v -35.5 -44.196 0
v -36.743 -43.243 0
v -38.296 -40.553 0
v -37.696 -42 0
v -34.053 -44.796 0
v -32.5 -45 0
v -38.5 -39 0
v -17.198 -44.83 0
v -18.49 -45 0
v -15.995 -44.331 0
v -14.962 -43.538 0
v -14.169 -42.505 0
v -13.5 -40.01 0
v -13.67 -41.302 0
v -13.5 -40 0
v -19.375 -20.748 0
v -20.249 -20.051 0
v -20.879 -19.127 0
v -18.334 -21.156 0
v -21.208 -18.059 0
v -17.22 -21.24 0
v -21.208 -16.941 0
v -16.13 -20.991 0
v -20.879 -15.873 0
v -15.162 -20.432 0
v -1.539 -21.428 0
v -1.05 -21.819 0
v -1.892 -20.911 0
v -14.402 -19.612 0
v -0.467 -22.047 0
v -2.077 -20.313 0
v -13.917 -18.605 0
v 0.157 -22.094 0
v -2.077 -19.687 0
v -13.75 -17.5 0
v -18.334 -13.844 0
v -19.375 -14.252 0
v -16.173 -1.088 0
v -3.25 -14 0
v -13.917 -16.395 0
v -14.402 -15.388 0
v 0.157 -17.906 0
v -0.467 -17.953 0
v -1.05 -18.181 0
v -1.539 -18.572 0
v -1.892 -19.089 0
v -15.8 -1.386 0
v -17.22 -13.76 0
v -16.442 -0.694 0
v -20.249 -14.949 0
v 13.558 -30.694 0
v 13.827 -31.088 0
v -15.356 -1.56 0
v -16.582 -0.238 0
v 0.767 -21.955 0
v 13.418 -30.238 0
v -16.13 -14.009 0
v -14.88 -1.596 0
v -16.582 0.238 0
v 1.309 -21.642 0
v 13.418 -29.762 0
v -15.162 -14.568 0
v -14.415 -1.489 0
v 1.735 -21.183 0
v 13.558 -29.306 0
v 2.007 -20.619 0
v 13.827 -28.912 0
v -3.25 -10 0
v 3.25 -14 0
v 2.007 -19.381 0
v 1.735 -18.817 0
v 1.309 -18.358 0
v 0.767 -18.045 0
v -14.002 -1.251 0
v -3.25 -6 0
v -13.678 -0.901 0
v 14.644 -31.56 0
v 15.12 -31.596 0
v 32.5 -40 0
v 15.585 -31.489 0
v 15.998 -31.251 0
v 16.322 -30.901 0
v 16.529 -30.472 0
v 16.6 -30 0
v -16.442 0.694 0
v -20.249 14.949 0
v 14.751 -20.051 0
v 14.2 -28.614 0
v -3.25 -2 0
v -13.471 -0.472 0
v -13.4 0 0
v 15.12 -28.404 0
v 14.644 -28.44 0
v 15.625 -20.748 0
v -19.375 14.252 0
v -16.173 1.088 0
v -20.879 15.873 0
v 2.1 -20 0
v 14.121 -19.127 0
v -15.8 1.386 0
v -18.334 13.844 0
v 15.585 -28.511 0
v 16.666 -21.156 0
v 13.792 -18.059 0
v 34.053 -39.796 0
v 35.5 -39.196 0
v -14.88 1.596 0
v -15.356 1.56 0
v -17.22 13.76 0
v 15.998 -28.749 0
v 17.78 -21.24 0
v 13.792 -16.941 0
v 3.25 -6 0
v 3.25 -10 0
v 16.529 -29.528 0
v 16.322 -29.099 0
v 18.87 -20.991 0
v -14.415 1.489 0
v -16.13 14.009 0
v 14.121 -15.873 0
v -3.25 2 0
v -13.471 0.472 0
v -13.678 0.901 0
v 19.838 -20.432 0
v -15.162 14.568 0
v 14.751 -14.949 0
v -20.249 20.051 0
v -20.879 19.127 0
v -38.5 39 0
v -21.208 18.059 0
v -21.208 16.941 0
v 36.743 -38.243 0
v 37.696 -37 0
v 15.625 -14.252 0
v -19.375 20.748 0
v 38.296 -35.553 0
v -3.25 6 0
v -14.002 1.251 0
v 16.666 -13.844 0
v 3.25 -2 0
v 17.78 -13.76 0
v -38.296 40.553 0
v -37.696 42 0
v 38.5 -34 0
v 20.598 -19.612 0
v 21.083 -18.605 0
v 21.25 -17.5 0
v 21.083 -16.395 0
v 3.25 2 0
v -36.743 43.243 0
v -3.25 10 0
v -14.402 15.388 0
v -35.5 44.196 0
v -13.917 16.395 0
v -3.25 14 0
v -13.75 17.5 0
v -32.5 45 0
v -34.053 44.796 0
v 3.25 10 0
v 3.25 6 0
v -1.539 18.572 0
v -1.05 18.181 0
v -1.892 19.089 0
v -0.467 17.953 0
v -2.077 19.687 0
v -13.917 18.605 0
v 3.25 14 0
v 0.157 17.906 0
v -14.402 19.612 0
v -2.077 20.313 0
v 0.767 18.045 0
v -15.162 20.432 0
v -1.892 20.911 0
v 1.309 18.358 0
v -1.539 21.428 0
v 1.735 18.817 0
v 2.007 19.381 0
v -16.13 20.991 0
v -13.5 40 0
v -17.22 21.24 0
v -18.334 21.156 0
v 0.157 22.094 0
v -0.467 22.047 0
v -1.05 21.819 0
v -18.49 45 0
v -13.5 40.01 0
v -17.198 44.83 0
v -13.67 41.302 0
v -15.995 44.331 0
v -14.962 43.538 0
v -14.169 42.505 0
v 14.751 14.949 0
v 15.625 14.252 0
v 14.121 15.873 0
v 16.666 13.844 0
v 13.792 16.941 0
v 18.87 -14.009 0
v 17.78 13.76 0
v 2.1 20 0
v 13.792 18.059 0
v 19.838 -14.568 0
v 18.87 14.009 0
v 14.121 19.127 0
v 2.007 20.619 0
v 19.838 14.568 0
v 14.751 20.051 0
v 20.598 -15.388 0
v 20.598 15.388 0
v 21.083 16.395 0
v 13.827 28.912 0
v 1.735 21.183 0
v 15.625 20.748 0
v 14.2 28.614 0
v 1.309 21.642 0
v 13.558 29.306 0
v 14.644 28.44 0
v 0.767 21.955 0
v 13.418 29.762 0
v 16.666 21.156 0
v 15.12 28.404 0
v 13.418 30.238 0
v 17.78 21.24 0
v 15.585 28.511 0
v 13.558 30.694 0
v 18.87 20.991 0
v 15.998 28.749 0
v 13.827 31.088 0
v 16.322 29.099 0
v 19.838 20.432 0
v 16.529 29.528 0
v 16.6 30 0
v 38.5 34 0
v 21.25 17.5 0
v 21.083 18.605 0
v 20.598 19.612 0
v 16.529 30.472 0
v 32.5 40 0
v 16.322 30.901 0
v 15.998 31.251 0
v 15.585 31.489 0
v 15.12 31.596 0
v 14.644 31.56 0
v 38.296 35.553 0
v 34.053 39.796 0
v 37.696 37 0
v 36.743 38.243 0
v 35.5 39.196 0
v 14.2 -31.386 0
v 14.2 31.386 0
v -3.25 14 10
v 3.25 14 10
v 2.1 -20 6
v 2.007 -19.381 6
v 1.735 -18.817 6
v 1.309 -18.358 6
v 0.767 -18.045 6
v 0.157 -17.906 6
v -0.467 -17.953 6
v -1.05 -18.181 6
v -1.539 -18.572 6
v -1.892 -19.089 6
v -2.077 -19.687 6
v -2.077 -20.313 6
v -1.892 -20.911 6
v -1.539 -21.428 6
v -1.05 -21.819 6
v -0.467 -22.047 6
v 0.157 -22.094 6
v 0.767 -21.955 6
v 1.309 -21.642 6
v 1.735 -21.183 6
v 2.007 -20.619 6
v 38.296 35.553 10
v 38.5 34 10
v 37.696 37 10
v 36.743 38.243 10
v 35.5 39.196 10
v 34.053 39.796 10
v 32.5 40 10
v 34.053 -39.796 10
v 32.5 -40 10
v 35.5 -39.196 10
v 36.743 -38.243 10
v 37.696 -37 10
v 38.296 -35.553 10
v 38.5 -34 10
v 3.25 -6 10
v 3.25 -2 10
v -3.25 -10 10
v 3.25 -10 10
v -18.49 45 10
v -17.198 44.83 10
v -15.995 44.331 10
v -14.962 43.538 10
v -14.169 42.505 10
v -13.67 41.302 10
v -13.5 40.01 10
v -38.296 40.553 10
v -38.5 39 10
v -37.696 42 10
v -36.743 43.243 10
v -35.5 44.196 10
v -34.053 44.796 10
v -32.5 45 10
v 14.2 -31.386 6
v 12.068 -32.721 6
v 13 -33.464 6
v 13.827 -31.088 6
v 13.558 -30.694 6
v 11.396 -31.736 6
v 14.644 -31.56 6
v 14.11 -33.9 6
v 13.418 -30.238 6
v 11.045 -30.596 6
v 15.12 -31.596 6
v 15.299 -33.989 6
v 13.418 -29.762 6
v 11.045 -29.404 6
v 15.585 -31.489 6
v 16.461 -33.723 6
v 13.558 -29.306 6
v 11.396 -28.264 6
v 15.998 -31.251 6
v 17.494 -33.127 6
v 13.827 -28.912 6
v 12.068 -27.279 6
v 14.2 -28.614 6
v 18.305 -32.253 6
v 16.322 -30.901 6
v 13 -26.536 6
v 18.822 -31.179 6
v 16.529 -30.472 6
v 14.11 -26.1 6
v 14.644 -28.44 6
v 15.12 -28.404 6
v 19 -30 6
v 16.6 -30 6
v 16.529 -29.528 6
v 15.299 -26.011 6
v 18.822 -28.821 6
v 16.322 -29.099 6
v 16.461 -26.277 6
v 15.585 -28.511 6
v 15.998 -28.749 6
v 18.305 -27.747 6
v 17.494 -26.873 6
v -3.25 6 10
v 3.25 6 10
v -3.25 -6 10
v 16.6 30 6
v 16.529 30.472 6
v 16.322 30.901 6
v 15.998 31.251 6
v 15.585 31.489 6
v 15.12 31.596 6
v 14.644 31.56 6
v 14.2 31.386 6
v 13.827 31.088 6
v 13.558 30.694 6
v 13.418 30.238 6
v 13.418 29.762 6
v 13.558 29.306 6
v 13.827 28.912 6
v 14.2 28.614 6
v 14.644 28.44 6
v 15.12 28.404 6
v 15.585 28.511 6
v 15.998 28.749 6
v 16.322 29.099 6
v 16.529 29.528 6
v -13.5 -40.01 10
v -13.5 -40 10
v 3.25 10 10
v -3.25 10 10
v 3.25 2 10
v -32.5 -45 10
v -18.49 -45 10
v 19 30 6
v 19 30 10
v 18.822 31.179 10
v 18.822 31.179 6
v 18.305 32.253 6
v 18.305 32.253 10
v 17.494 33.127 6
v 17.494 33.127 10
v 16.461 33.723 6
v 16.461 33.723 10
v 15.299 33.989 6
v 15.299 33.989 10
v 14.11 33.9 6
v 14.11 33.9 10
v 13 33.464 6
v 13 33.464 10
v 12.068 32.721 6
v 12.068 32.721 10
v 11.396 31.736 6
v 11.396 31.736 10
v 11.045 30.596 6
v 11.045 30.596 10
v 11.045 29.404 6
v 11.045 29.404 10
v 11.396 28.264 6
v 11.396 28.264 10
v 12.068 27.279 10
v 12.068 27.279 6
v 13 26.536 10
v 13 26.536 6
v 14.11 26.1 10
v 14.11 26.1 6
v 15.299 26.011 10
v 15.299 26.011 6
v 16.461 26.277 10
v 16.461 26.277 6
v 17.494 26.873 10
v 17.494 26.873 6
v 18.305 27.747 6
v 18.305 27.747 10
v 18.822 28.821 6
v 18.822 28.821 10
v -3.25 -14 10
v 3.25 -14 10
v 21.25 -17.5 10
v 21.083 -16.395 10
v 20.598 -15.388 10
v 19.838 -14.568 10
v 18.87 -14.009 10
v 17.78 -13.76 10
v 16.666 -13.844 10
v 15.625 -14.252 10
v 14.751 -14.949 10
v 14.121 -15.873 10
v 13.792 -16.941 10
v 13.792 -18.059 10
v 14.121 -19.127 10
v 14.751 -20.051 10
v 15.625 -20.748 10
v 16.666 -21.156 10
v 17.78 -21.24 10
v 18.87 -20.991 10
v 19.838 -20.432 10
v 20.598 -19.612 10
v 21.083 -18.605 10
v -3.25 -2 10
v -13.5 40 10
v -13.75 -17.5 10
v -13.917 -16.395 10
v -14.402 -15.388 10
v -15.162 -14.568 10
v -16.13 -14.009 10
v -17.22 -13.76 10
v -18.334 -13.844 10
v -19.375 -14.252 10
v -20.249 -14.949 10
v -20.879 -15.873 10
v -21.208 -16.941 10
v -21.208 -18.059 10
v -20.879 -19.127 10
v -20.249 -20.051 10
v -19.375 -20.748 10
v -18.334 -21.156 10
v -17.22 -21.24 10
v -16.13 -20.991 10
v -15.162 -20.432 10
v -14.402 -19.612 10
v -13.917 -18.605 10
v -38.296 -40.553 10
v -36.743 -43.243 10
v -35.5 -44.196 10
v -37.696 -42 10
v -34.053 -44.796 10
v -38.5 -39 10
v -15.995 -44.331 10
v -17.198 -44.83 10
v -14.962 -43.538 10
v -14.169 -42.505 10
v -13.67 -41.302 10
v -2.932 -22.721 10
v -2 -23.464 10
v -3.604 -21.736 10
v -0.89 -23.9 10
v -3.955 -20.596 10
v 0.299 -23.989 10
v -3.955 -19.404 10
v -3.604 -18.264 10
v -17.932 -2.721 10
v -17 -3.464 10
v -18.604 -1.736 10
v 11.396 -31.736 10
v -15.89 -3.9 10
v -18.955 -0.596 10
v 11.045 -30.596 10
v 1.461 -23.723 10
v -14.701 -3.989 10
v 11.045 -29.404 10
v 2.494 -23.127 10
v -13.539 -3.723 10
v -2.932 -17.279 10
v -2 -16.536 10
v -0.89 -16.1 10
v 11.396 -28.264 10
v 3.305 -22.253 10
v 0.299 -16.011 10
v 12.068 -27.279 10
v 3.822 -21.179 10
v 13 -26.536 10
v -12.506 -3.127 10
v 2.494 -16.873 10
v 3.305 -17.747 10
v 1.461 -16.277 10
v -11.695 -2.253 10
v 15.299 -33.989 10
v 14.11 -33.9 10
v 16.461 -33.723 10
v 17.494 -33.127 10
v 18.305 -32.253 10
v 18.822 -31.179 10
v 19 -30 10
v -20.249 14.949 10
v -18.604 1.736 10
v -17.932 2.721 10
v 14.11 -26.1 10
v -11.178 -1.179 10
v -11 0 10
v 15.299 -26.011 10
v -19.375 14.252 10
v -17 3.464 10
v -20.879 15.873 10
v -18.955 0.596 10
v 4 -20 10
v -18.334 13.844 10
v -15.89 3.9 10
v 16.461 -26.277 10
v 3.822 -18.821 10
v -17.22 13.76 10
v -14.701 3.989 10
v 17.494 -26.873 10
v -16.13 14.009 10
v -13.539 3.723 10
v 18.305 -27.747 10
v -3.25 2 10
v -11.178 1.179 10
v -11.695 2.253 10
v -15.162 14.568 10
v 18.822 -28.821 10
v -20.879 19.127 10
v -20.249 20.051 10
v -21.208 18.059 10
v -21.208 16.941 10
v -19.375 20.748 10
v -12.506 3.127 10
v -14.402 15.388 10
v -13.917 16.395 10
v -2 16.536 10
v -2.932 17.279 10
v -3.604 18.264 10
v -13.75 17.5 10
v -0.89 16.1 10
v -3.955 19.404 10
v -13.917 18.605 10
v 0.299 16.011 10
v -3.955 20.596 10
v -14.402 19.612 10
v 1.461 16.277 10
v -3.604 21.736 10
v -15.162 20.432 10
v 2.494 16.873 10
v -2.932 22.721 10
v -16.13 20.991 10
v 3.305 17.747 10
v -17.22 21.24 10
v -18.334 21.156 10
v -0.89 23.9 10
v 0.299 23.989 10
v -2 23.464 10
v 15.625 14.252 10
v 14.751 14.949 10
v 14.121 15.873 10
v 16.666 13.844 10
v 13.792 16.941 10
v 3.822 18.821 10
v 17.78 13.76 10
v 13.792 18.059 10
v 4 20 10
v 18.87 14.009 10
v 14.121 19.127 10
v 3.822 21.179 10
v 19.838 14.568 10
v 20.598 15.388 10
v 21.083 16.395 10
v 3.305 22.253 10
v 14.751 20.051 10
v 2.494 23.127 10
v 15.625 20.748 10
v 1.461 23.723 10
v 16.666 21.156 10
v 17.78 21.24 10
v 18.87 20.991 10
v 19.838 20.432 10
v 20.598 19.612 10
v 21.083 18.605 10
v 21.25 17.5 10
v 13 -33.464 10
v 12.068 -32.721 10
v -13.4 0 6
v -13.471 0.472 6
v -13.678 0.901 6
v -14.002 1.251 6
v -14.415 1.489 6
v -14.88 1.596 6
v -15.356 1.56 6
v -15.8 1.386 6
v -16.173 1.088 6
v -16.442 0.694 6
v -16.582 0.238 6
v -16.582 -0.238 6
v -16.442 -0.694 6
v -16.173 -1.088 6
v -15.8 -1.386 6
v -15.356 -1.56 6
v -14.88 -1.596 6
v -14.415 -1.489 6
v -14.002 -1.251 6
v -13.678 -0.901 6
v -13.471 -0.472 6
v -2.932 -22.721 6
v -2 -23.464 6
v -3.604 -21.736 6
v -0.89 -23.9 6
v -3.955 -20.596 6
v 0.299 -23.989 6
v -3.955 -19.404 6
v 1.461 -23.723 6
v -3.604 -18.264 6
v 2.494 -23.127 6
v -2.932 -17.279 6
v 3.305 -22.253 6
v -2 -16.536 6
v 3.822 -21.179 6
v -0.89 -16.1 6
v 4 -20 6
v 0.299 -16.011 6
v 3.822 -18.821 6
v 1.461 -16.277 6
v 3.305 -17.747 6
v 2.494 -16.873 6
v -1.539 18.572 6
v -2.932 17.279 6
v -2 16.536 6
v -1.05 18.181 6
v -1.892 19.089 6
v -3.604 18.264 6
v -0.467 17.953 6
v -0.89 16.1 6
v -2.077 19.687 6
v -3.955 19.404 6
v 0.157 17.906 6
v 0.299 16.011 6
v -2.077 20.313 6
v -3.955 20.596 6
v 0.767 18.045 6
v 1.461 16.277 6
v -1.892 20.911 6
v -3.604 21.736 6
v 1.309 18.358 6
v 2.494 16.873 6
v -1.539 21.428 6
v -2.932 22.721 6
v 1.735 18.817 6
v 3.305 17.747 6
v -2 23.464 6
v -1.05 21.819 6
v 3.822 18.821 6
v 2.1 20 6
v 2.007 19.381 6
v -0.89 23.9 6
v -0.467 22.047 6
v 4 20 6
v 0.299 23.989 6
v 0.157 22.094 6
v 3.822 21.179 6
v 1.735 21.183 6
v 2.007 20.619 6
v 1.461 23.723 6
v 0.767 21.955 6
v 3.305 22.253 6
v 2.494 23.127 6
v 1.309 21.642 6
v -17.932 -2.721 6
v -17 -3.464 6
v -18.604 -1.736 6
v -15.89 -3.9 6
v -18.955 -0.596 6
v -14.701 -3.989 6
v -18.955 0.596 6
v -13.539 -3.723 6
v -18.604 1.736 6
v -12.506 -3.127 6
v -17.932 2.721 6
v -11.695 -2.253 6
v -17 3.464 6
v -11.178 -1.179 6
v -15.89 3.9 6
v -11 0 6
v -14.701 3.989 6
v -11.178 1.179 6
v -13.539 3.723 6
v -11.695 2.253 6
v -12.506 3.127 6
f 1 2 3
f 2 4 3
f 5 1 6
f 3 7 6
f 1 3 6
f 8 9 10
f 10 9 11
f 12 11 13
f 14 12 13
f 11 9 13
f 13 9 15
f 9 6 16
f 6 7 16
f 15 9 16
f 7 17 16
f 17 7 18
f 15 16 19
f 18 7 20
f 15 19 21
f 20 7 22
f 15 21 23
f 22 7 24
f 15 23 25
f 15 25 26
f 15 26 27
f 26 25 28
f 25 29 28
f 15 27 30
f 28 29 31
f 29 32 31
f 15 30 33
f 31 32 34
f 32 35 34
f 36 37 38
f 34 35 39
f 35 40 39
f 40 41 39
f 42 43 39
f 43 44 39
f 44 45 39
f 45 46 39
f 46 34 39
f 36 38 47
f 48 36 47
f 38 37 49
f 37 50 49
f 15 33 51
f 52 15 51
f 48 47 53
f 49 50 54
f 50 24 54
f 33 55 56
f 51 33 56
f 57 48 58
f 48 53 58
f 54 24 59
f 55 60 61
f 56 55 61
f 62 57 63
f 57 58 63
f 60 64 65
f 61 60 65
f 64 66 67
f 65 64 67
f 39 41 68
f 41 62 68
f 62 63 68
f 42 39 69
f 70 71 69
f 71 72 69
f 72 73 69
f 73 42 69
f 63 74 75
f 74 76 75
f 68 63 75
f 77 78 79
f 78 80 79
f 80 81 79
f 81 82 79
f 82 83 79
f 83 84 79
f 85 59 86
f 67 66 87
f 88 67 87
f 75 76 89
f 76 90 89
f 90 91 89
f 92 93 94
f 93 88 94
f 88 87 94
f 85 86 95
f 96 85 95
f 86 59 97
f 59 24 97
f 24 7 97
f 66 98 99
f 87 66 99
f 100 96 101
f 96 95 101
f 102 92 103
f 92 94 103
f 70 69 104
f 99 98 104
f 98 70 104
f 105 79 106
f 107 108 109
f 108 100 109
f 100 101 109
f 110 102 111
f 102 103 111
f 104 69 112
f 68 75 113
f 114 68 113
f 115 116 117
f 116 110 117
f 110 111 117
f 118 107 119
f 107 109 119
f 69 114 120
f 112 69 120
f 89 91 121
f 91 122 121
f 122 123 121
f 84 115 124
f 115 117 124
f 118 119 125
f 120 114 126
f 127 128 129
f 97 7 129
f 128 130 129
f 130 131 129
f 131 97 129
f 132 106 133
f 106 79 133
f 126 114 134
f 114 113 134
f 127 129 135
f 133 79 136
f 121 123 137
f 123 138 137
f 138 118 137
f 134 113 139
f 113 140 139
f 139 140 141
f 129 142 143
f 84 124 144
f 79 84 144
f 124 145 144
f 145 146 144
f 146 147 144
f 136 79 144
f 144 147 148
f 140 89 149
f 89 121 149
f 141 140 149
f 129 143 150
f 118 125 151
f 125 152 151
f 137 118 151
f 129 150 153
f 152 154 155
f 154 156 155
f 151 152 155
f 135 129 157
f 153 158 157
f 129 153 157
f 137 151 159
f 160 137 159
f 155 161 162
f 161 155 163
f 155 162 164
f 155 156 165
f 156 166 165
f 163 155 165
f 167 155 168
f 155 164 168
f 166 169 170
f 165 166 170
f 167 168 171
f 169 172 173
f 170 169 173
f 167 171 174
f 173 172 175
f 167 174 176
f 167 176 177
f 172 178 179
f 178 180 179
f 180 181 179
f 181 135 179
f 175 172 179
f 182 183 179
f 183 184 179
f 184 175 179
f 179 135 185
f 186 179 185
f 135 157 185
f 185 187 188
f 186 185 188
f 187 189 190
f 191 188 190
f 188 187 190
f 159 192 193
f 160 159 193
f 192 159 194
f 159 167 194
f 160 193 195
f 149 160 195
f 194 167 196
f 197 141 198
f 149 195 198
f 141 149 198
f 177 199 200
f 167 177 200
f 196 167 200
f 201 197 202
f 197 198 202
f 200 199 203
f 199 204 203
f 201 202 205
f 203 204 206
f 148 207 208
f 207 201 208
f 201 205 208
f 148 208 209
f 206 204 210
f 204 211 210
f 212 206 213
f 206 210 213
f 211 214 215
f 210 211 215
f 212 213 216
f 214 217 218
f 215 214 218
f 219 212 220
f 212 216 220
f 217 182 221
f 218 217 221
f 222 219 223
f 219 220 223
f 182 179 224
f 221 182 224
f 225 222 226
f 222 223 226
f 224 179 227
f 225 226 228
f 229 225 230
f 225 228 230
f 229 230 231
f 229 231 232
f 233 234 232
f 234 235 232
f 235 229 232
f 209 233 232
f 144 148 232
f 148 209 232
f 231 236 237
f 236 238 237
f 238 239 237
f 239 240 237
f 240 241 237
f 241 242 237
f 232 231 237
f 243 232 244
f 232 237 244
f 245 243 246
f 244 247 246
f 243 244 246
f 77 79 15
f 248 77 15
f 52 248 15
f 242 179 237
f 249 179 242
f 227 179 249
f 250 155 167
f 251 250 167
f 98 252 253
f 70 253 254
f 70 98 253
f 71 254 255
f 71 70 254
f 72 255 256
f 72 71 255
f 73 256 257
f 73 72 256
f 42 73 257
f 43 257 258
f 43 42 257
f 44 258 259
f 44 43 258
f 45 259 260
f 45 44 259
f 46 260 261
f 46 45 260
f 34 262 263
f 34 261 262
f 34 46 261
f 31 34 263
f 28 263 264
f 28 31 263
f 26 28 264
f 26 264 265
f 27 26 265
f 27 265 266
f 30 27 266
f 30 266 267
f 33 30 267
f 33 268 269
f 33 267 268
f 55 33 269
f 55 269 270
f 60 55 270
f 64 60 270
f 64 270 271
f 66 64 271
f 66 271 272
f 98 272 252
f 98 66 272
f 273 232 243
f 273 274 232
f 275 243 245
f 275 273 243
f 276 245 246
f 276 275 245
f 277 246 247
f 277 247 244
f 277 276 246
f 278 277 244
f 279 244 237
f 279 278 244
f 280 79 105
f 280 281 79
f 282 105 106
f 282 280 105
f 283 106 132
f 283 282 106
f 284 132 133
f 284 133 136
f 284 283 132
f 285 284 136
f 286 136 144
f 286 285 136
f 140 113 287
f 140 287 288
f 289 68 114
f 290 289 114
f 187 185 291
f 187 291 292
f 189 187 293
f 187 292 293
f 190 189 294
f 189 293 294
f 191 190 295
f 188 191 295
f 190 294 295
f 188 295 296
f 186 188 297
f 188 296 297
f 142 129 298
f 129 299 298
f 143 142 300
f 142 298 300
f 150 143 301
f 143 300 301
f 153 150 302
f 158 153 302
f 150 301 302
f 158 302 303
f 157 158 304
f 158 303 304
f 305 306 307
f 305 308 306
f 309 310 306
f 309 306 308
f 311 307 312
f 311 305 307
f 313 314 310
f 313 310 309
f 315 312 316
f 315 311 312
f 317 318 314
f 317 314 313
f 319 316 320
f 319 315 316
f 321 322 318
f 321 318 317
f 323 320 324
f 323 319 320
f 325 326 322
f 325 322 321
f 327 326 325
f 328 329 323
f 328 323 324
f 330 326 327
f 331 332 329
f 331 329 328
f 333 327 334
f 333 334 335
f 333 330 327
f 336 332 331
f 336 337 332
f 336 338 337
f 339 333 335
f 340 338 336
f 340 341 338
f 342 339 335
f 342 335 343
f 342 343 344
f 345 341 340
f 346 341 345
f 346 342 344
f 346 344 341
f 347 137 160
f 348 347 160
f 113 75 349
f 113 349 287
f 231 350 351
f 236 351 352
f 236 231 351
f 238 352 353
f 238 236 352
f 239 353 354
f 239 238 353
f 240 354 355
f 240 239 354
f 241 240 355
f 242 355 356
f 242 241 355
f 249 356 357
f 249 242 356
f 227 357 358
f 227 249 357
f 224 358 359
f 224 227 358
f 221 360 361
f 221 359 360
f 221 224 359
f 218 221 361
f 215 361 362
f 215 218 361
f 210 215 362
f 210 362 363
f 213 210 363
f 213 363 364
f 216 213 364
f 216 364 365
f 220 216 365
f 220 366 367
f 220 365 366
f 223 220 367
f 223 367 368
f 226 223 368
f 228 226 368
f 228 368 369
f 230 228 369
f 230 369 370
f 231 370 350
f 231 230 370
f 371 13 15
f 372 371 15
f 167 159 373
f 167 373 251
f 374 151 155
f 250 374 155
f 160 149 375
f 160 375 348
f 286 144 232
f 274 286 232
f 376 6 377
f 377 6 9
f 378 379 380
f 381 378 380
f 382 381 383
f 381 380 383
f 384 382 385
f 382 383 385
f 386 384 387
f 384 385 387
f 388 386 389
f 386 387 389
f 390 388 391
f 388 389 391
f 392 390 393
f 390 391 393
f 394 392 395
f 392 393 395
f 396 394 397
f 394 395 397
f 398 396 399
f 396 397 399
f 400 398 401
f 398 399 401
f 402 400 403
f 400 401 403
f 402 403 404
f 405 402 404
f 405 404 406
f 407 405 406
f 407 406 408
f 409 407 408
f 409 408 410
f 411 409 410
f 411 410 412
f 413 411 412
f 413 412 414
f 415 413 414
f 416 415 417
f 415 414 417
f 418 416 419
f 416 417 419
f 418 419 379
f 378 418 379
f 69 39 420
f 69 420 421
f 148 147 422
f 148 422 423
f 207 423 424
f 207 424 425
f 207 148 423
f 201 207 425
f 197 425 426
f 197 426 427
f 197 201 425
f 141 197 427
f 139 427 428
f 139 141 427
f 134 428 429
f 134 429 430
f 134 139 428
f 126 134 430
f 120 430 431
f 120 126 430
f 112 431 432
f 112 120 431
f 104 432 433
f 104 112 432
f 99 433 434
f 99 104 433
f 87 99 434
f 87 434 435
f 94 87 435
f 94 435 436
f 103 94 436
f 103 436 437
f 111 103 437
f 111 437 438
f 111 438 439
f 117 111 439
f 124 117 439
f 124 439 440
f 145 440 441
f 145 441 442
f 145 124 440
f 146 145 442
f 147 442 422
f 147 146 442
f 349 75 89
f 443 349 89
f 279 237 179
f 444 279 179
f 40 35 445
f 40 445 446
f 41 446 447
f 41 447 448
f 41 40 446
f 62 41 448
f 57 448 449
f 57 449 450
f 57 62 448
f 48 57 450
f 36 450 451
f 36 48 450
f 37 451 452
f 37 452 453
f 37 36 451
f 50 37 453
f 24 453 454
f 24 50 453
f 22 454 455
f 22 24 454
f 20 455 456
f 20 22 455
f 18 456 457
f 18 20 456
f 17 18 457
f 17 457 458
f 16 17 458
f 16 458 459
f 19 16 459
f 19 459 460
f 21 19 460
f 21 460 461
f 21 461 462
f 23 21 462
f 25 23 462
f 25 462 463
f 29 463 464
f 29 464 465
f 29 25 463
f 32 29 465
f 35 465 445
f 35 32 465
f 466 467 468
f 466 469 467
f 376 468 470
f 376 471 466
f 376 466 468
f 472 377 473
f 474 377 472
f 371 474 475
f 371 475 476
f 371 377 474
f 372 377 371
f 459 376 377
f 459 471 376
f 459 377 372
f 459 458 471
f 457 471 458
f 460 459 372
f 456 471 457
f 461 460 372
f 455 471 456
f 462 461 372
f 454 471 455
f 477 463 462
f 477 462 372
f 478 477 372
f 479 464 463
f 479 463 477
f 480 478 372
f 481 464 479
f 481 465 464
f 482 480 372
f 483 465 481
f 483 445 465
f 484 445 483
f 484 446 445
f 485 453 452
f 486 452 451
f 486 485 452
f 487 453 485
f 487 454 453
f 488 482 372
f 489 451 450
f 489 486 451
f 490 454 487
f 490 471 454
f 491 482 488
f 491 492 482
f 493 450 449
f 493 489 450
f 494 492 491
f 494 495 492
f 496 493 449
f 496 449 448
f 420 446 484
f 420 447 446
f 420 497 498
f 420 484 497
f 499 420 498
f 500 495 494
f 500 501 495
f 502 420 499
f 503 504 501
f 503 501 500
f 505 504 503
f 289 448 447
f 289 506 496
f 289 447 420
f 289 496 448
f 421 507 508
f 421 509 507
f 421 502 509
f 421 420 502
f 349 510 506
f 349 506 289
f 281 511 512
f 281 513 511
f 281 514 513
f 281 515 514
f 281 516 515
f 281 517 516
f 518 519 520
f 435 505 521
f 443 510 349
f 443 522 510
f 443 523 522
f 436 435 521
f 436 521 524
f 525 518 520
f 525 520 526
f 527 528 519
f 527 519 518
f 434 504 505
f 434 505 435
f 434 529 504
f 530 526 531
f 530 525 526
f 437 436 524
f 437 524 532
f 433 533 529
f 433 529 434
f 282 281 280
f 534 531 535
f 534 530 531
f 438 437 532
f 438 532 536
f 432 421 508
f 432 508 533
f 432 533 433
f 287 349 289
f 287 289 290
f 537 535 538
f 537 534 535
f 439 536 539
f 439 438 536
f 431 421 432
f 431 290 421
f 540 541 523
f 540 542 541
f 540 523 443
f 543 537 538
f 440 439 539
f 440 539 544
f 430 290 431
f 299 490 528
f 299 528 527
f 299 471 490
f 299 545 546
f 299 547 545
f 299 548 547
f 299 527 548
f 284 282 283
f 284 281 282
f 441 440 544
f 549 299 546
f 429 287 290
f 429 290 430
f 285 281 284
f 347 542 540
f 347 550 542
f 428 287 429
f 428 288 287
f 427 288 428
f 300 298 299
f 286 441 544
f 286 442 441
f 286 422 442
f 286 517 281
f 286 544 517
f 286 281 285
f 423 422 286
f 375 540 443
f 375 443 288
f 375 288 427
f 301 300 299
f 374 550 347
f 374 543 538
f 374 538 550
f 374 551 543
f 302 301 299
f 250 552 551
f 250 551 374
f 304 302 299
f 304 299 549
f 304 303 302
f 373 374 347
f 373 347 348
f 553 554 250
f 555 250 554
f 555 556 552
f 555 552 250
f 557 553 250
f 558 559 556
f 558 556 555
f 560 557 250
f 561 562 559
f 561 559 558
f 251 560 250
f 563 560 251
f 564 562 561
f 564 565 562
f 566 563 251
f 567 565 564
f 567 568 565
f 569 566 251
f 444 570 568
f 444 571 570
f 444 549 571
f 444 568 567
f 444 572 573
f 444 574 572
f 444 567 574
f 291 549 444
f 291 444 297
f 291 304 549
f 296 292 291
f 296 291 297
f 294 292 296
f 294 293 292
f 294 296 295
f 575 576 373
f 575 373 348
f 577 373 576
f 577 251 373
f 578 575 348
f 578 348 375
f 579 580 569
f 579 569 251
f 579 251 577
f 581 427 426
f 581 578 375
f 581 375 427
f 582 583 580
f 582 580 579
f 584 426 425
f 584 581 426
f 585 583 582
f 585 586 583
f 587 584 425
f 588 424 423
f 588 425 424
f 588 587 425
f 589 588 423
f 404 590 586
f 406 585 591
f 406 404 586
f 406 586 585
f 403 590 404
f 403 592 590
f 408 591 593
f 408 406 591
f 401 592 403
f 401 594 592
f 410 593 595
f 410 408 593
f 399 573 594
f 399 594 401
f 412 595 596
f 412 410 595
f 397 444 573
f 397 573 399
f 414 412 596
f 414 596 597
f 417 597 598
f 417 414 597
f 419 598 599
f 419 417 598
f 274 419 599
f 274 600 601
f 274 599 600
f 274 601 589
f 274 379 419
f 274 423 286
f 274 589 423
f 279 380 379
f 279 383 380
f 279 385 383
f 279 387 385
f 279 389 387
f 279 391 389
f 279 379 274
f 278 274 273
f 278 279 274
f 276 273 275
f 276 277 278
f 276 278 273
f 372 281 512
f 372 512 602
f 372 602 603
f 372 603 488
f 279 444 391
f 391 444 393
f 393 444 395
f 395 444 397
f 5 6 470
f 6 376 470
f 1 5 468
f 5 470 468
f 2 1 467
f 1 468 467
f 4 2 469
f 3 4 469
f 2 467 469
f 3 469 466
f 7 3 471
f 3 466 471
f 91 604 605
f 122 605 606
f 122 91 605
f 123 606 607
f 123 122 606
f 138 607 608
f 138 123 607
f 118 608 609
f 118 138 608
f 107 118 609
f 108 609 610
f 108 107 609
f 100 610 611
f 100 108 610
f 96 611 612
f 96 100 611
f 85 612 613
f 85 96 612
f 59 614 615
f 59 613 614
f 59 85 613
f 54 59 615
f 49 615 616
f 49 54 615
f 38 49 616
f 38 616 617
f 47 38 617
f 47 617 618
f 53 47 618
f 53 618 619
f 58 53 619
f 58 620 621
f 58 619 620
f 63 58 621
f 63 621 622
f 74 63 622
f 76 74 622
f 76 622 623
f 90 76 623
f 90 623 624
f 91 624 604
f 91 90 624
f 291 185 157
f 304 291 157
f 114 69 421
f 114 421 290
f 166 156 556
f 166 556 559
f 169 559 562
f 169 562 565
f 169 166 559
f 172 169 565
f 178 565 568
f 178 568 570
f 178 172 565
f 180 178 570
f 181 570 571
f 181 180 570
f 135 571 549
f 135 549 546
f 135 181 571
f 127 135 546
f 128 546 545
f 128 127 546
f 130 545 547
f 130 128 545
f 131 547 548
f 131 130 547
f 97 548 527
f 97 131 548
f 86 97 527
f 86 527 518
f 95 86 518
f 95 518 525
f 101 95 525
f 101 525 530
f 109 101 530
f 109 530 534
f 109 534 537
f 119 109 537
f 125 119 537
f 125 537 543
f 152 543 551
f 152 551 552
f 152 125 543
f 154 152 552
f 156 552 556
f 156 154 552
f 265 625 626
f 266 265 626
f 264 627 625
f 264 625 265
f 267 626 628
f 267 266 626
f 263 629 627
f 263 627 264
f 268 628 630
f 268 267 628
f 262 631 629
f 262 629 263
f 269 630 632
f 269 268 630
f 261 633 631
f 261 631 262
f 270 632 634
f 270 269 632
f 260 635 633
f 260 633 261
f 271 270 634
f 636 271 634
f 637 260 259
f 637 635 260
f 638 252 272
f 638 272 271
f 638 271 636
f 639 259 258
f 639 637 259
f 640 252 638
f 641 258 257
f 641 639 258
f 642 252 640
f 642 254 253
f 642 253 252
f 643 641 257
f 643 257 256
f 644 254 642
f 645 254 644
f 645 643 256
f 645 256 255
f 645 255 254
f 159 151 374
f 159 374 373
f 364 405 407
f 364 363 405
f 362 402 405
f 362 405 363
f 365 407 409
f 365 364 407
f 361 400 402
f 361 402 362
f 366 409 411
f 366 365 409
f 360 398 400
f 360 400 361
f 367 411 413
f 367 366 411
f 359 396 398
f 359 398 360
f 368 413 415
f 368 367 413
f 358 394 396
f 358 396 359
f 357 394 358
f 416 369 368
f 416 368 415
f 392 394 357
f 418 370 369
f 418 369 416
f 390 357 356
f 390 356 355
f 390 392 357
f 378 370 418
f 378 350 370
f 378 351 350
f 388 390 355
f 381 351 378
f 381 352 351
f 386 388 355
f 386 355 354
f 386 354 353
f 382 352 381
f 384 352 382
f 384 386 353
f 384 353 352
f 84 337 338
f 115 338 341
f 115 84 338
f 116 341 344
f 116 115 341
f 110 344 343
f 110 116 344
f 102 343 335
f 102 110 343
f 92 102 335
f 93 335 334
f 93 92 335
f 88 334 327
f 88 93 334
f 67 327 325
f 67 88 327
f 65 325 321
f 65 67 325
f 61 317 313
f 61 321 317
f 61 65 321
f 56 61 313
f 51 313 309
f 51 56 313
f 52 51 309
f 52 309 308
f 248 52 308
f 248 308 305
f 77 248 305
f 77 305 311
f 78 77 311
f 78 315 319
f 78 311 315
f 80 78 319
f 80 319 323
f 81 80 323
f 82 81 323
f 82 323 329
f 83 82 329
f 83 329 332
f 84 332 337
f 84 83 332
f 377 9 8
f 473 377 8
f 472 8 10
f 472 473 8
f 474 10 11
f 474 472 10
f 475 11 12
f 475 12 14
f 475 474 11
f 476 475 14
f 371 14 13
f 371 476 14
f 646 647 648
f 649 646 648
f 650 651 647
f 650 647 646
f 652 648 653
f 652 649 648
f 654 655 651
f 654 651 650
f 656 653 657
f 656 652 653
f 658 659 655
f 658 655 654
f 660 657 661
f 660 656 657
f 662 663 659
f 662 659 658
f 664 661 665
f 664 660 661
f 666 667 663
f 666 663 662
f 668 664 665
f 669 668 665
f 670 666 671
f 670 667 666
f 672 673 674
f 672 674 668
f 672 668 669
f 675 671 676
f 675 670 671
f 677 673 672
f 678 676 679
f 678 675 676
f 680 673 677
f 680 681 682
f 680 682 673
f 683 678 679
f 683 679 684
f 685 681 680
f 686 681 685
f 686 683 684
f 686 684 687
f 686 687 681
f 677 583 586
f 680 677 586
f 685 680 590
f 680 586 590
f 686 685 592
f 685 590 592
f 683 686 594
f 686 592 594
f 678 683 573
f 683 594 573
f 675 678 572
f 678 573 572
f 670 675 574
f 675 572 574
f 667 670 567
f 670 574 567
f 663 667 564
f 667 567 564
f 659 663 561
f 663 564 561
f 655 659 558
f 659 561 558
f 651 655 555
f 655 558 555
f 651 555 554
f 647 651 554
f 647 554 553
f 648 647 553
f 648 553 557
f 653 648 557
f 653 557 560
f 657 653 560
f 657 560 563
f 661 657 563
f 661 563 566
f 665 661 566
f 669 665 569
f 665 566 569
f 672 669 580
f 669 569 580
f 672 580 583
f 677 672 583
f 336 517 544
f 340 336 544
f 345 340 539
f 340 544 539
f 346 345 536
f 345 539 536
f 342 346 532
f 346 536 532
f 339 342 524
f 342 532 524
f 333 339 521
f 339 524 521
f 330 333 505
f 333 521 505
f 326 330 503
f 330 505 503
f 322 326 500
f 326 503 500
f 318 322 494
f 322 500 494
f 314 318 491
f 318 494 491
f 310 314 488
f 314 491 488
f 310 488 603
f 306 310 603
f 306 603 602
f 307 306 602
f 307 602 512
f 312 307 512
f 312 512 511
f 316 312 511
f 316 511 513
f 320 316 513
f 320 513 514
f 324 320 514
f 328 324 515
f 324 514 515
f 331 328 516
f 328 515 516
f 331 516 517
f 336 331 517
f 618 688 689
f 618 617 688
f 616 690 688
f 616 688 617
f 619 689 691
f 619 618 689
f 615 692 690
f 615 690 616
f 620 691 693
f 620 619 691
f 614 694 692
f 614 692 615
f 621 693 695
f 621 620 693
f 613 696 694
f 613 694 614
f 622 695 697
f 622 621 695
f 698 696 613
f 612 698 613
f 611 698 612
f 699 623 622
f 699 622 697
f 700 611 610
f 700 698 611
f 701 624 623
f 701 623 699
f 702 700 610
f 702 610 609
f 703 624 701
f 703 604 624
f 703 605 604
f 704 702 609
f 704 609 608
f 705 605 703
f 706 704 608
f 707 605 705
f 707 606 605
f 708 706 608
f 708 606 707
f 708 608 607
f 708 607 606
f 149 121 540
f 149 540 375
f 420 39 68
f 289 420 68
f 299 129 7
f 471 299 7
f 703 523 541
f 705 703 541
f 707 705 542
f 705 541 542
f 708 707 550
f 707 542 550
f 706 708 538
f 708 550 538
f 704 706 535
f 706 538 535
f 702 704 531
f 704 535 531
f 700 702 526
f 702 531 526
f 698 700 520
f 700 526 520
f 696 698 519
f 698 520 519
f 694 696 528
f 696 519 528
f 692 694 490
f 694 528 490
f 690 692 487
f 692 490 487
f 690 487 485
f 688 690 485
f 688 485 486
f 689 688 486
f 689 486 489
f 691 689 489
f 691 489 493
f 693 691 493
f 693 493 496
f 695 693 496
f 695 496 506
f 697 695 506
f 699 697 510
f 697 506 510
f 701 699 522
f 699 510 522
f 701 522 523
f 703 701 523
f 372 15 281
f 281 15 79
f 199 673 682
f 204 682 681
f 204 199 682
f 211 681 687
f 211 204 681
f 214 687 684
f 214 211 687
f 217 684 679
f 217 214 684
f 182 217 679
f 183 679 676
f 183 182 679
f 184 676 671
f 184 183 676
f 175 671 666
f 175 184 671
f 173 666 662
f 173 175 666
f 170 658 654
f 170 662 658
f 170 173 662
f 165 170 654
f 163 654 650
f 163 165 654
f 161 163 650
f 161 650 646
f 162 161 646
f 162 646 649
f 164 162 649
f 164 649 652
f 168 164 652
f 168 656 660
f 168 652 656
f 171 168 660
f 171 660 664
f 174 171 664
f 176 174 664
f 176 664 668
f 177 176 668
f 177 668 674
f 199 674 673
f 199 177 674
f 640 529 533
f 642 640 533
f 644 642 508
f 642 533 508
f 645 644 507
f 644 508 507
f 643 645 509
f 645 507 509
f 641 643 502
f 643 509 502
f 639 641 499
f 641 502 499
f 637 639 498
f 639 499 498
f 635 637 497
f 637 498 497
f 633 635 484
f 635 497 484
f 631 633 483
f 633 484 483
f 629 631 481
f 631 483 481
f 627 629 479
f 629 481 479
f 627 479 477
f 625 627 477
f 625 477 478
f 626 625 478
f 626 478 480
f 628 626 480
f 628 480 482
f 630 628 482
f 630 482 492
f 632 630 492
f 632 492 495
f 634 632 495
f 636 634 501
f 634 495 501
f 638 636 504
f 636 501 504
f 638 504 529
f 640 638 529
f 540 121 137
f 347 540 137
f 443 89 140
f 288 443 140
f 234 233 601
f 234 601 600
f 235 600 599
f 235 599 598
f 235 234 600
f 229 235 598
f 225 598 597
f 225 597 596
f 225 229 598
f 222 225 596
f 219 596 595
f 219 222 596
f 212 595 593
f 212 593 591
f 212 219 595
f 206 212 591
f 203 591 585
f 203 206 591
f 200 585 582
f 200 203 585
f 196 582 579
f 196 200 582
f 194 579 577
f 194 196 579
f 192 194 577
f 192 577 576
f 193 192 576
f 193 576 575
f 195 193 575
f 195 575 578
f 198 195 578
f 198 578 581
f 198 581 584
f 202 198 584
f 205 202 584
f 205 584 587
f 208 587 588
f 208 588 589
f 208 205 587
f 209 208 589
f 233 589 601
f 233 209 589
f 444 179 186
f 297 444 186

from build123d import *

# Parameters (mm, degrees)
SKETCH_R     = 1.6
SKETCH_R_2   = 2.1
SKETCH_R_3   = 3.75
SKETCH_W     = 6.5
SKETCH_H     = 4
PAD_DEPTH    = 10
SKETCH001_R  = 4
POCKET_DEPTH = 4
FILLET_R     = 6
FILLET001_R  = 4.99


with BuildPart() as part:
    # Sketch → Pad (new body)
    with BuildSketch(Plane.XY):
        Polygon((-38.5, 40), (-38.5, -40), (-38.5, -45), (-13.5, -45), (-13.5, -40), (38.5, -40), (38.5, 40), (-13.5, 40), (-13.5, 45), (-38.5, 45), align=None)
        with Locations((-15, 0)):
            Circle(SKETCH_R, mode=Mode.SUBTRACT)
        with Locations((15, -30)):
            Circle(SKETCH_R, mode=Mode.SUBTRACT)
        with Locations((0, 20)):
            Circle(SKETCH_R_2, mode=Mode.SUBTRACT)
        with Locations((0, -20)):
            Circle(SKETCH_R_2, mode=Mode.SUBTRACT)
        with Locations((15, 30)):
            Circle(SKETCH_R, mode=Mode.SUBTRACT)
        with Locations((-17.5, 17.5)):
            Circle(SKETCH_R_3, mode=Mode.SUBTRACT)
        with Locations((-17.5, -17.5)):
            Circle(SKETCH_R_3, mode=Mode.SUBTRACT)
        with Locations((17.5, -17.5)):
            Circle(SKETCH_R_3, mode=Mode.SUBTRACT)
        with Locations((17.5, 17.5)):
            Circle(SKETCH_R_3, mode=Mode.SUBTRACT)
        with Locations((0, 4)):
            Rectangle(SKETCH_W, SKETCH_H, mode=Mode.SUBTRACT)
        with Locations((0, -4)):
            Rectangle(SKETCH_W, SKETCH_H, mode=Mode.SUBTRACT)
        with Locations((0, 12)):
            Rectangle(SKETCH_W, SKETCH_H, mode=Mode.SUBTRACT)
        with Locations((0, -12)):
            Rectangle(SKETCH_W, SKETCH_H, mode=Mode.SUBTRACT)
    extrude(amount=PAD_DEPTH)

    # Sketch001 (on Face34 of Pad) → Pocket (cut)
    with BuildSketch(Plane.XY.offset(10)):
        with Locations((-15, 0)):
            Circle(SKETCH001_R)
        with Locations((15, -30)):
            Circle(SKETCH001_R)
        with Locations((15, 30)):
            Circle(SKETCH001_R)
        with Locations((0, 20)):
            Circle(SKETCH001_R)
        with Locations((0, -20)):
            Circle(SKETCH001_R)
    extrude(amount=-POCKET_DEPTH, mode=Mode.SUBTRACT)

    # Fillet
    fillet_edges = [part.edges().sort_by_distance(p)[0] for p in [
        (-38.5, -45, 5),
        (38.5, -40, 5),
        (-38.5, 45, 5),
        (38.5, 40, 5),
    ]]
    fillet(fillet_edges, radius=FILLET_R)

    # Fillet001
    fillet001_edges = [part.edges().sort_by_distance(p)[0] for p in [
        (-13.5, 45, 5),
        (-13.5, -45, 5),
    ]]
    fillet(fillet001_edges, radius=FILLET001_R)


solid = part.part
